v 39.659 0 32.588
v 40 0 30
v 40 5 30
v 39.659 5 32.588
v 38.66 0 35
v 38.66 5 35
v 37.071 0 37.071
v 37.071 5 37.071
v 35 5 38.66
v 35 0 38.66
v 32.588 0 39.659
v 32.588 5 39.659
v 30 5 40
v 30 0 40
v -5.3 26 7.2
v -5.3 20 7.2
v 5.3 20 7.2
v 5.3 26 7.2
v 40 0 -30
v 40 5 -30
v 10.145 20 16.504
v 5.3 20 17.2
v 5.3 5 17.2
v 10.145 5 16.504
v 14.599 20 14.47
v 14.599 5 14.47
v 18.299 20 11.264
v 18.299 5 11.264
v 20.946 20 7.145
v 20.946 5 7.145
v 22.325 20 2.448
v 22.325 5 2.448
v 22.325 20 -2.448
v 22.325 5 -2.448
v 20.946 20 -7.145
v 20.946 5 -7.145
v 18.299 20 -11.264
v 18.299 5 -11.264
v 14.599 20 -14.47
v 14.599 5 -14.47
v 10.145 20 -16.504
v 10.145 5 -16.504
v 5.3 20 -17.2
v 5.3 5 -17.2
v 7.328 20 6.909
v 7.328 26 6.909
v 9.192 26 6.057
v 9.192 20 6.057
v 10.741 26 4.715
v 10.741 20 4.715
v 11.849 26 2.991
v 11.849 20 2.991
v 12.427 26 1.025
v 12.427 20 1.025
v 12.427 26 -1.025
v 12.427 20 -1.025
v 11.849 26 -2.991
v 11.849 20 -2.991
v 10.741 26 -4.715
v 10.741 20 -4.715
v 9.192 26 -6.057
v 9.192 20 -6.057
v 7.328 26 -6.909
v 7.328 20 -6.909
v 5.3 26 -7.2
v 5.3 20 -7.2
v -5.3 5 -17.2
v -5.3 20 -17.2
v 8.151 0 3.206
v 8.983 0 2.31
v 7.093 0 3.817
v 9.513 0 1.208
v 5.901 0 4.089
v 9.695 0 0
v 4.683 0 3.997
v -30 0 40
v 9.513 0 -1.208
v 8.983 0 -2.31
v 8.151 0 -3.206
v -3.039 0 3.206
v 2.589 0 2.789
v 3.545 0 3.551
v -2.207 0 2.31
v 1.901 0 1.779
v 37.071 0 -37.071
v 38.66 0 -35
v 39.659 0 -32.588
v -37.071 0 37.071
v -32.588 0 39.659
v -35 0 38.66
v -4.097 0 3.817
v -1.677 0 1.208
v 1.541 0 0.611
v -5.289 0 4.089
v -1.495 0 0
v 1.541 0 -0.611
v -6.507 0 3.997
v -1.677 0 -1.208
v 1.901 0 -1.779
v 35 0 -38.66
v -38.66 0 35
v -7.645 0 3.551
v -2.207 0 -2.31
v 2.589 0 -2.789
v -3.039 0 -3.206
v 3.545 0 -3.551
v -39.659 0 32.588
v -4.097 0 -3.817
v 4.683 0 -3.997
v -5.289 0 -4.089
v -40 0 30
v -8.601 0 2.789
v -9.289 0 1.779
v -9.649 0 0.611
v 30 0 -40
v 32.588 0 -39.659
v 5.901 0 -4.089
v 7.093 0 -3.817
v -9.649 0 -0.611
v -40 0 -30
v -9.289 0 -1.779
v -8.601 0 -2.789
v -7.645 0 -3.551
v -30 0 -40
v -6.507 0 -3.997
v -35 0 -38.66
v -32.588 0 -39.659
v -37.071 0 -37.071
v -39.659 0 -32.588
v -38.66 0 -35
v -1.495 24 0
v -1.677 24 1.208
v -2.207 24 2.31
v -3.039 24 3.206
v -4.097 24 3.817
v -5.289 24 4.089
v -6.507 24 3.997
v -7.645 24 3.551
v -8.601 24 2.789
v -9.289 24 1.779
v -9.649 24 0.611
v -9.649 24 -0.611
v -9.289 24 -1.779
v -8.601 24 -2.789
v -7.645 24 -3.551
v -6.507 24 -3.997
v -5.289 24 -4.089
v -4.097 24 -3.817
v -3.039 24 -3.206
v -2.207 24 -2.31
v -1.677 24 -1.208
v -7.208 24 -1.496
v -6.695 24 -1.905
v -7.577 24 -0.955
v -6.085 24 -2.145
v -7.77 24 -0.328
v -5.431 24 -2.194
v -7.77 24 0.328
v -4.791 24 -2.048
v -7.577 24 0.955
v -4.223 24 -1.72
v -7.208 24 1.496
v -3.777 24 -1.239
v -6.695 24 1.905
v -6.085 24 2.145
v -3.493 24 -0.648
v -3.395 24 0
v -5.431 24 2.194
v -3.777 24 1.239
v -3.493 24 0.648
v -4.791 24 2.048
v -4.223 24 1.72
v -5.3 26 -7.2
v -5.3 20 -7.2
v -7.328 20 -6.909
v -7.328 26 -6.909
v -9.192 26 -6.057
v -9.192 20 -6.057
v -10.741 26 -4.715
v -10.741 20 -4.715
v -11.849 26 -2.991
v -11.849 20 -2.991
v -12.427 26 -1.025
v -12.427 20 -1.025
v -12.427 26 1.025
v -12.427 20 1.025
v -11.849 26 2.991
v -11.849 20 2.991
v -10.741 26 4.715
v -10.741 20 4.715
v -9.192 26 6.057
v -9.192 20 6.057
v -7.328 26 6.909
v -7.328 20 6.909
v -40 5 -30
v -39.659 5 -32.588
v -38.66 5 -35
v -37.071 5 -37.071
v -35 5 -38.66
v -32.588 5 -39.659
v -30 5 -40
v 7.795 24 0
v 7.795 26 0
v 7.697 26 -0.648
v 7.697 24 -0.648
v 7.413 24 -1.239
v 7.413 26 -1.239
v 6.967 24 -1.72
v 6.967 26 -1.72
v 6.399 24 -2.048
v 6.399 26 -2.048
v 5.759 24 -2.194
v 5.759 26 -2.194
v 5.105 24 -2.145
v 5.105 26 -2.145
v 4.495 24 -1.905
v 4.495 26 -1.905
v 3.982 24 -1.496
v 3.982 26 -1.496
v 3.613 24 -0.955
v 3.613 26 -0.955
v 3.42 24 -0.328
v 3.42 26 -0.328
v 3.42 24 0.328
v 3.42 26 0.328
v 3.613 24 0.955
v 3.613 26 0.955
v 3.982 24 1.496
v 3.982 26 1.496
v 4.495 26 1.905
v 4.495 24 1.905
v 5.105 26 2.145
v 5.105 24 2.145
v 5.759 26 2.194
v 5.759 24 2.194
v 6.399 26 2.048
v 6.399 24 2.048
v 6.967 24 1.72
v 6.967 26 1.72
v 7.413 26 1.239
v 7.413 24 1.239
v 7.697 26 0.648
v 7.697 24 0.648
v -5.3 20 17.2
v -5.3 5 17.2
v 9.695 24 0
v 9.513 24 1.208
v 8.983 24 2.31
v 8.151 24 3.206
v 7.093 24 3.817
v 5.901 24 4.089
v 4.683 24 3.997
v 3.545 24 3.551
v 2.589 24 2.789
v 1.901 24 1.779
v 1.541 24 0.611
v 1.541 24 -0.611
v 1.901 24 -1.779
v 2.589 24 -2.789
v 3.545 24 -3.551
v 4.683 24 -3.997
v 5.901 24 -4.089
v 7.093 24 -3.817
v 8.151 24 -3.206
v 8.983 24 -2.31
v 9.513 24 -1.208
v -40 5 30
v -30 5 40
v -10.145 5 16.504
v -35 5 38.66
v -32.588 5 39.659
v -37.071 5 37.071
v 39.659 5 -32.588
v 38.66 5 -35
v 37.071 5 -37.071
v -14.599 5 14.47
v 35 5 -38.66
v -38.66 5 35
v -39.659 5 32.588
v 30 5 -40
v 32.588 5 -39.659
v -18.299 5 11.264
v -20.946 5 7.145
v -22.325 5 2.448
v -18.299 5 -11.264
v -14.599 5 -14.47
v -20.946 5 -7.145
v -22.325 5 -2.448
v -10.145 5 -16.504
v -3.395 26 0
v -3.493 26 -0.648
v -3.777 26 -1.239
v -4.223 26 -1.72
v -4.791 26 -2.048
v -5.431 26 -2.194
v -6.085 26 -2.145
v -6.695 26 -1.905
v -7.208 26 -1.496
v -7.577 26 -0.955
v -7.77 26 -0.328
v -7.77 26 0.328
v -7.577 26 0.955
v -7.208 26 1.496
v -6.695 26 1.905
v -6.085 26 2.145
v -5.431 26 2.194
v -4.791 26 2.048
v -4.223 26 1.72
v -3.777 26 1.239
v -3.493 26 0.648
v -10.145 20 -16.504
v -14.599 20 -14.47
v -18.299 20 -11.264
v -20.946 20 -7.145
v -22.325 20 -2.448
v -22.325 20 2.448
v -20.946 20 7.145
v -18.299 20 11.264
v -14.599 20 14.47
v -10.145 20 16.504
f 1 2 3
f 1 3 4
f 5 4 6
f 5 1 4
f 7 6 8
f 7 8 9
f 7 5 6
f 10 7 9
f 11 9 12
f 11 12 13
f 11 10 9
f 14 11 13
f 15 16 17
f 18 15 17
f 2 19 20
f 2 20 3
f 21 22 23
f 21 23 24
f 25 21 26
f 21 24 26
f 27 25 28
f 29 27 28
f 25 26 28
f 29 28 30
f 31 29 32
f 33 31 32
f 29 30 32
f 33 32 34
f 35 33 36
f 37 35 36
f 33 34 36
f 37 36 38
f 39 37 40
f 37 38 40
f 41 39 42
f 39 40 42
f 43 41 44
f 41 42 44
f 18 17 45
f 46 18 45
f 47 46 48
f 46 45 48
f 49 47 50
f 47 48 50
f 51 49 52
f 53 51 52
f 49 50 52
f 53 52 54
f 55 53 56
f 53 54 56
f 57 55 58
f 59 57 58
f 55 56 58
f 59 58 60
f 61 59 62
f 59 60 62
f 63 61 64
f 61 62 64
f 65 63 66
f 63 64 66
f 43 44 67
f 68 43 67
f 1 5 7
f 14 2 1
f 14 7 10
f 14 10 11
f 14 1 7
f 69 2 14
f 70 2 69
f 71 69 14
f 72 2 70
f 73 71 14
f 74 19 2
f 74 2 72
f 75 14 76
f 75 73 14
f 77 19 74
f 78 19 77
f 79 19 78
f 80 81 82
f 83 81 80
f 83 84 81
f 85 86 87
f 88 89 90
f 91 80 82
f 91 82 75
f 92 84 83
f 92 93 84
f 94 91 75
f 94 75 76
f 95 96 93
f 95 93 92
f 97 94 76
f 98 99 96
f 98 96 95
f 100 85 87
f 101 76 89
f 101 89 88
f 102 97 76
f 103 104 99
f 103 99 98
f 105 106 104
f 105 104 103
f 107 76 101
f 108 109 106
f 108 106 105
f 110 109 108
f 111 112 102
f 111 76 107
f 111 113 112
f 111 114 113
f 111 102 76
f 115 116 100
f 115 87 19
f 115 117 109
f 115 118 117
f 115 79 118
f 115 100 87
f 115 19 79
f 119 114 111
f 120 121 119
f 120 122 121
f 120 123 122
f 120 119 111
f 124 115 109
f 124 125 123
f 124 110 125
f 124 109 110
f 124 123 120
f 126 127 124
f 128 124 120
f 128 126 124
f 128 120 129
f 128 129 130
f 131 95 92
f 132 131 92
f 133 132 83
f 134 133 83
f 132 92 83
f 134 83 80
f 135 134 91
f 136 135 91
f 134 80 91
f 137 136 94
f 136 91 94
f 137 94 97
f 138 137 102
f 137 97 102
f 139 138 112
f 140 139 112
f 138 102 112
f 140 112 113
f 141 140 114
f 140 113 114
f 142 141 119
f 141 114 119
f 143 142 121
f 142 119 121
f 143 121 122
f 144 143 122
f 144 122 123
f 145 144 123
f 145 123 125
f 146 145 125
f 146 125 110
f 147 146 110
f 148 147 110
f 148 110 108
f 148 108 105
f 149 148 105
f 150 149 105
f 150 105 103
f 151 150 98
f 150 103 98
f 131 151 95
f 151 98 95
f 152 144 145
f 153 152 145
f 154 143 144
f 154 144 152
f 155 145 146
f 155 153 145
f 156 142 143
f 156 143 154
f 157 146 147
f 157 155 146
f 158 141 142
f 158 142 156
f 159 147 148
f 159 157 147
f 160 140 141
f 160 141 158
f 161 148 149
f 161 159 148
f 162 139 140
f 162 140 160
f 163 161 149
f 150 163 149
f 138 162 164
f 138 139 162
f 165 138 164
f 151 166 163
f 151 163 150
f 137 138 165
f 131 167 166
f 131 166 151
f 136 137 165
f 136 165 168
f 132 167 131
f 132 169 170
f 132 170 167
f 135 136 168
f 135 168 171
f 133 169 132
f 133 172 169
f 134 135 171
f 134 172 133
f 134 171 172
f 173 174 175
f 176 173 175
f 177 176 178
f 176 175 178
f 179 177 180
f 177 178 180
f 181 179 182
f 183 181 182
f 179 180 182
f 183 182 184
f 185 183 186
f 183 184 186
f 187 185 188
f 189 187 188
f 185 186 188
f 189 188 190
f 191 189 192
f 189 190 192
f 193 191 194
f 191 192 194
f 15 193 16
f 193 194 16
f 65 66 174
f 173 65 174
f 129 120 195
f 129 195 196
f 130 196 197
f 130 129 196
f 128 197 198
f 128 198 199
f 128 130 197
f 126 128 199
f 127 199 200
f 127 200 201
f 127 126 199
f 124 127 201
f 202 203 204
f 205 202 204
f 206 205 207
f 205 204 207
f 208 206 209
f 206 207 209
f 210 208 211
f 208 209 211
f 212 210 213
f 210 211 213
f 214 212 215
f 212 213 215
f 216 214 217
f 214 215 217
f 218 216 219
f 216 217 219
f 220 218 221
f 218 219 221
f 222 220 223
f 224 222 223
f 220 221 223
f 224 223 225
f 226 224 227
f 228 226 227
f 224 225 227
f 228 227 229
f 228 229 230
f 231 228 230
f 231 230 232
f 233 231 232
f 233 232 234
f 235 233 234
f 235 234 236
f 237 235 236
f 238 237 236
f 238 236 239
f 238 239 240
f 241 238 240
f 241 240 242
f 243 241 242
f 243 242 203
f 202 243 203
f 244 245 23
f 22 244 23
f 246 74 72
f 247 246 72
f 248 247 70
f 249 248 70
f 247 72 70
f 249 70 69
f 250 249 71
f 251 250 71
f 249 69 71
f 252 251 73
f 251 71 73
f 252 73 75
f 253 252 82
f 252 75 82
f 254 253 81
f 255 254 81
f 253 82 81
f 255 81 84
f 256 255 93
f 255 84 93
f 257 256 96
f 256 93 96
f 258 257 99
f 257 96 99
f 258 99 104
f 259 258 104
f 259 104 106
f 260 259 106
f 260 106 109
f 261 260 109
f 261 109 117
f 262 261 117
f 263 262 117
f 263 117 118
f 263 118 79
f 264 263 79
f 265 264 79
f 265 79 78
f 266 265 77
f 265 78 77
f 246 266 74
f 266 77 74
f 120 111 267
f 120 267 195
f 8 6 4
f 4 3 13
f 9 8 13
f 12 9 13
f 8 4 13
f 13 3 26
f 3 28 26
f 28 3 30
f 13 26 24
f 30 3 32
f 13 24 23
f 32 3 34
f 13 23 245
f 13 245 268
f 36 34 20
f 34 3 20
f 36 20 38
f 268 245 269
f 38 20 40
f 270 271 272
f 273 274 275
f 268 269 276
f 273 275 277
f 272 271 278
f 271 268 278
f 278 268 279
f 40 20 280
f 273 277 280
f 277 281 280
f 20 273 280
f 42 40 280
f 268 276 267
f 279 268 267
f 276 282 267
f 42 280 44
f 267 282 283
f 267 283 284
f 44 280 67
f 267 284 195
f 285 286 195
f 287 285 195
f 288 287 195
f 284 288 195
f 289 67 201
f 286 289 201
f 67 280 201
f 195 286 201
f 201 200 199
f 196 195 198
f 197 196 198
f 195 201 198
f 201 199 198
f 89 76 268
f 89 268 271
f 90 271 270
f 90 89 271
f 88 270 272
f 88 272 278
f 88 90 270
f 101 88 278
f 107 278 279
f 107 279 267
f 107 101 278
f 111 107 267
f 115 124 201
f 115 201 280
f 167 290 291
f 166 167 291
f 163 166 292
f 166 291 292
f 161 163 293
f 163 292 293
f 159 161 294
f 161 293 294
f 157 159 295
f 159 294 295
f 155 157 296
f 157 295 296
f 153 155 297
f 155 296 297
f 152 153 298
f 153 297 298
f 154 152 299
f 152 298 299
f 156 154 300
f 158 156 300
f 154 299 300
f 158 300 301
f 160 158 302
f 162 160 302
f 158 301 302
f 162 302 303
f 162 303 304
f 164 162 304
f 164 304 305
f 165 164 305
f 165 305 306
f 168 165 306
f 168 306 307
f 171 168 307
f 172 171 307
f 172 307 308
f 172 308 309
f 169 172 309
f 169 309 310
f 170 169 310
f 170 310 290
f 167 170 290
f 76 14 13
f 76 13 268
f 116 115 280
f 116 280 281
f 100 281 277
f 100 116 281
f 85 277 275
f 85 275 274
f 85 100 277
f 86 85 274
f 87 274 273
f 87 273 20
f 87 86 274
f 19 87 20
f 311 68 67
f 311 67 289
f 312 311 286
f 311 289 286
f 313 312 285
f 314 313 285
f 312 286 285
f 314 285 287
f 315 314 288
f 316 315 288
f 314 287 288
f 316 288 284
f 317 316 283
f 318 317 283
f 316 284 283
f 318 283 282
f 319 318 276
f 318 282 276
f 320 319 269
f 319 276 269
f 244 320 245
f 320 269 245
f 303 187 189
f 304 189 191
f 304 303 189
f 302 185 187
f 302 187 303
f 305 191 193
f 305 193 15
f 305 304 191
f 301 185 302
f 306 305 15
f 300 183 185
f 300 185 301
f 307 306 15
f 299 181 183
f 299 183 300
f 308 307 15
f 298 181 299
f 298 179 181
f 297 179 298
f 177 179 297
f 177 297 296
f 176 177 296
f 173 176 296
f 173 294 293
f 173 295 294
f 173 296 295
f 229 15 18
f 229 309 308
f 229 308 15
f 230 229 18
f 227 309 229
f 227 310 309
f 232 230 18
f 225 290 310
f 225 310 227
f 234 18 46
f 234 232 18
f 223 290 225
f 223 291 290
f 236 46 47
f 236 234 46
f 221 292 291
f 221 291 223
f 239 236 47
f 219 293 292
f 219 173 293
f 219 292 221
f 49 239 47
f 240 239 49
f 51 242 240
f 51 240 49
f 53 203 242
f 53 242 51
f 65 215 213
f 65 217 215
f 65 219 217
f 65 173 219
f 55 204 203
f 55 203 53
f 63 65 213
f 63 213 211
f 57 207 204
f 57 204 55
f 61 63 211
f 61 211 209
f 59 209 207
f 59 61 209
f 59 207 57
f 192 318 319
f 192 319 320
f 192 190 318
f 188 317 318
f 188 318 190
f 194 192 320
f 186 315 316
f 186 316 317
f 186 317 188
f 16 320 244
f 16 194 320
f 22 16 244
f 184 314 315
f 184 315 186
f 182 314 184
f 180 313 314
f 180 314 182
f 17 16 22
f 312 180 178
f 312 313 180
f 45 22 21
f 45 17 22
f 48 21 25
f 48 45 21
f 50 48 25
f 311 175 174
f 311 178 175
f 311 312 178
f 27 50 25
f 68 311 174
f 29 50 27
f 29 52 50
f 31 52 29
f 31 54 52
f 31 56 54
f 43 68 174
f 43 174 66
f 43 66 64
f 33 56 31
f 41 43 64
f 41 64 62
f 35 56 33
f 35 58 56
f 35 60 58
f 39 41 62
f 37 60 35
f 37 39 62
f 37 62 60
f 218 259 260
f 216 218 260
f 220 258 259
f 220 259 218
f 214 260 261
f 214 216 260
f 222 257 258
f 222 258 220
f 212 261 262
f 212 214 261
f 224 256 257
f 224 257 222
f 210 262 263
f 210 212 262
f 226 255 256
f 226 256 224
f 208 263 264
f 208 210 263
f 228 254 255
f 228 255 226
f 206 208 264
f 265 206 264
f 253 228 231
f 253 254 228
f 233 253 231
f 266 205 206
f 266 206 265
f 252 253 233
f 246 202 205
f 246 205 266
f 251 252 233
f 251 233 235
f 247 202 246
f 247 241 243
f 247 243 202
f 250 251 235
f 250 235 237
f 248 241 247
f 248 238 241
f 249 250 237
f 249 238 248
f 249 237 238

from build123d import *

# Parameters (mm, degrees)
BOSS_EXTRUDE1_DEPTH = 5
BOSS_EXTRUDE2_DEPTH = 15
BOSS_EXTRUDE3_DEPTH = 6
SKETCH6_R           = 2.2
CUT_EXTRUDE1_DEPTH  = 27
SKETCH7_R           = 4.1
CUT_EXTRUDE2_DEPTH  = 24


with BuildPart() as part:
    # Sketch1 → Boss-Extrude1 (new body)
    with BuildSketch(Plane(origin=(0, 0, 0), x_dir=(1, 0, 0), z_dir=(0, 1, 0))):
        with BuildLine():
            Line((30, -40), (-30, -40))
            ThreePointArc((-30, -40), (-37.071067812, -37.071067812), (-40, -30))
            Line((-40, -30), (-40, 30))
            ThreePointArc((-40, 30), (-37.071067812, 37.071067812), (-30, 40))
            Line((-30, 40), (30, 40))
            ThreePointArc((30, 40), (37.071067812, 37.071067812), (40, 30))
            Line((40, 30), (40, -30))
            ThreePointArc((40, -30), (37.071067812, -37.071067812), (30, -40))
        make_face()
    extrude(amount=BOSS_EXTRUDE1_DEPTH)

    # Sketch4 → Boss-Extrude2 (add)
    with BuildSketch(Plane(origin=(0, 5, 0), x_dir=(1, 0, 0), z_dir=(0, 1, 0))):
        with BuildLine():
            Line((-5.29954084, -17.20045916), (5.29954084, -17.20045916))
            ThreePointArc((5.29954084, -17.20045916), (22.5, 0), (5.29954084, 17.20045916))
            Line((5.29954084, 17.20045916), (-5.29954084, 17.20045916))
            ThreePointArc((-5.29954084, 17.20045916), (-22.5, 0), (-5.29954084, -17.20045916))
        make_face()
    extrude(amount=BOSS_EXTRUDE2_DEPTH)

    # Sketch5 → Boss-Extrude3 (add)
    with BuildSketch(Plane(origin=(0, 20, 0), x_dir=(1, 0, 0), z_dir=(0, 1, 0))):
        with BuildLine():
            Line((-5.29954084, -7.20045916), (5.29954084, -7.20045916))
            ThreePointArc((5.29954084, -7.20045916), (12.5, 0), (5.29954084, 7.20045916))
            Line((5.29954084, 7.20045916), (-5.29954084, 7.20045916))
            ThreePointArc((-5.29954084, 7.20045916), (-12.5, 0), (-5.29954084, -7.20045916))
        make_face()
    extrude(amount=BOSS_EXTRUDE3_DEPTH)

    # Sketch6 → Cut-Extrude1 (cut)
    with BuildSketch(Plane(origin=(0, 26, 0), x_dir=(1, 0, 0), z_dir=(0, 1, 0))):
        with Locations((-5.595, 0)):
            Circle(SKETCH6_R)
        with Locations((5.595, 0)):
            Circle(SKETCH6_R)
    extrude(amount=-CUT_EXTRUDE1_DEPTH, mode=Mode.SUBTRACT)

    # Sketch7 → Cut-Extrude2 (cut)
    with BuildSketch(Plane.XZ):
        with Locations((5.595, 0)):
            Circle(SKETCH7_R)
        with Locations((-5.595, 0)):
            Circle(SKETCH7_R)
    extrude(amount=-CUT_EXTRUDE2_DEPTH, mode=Mode.SUBTRACT)


solid = part.part
